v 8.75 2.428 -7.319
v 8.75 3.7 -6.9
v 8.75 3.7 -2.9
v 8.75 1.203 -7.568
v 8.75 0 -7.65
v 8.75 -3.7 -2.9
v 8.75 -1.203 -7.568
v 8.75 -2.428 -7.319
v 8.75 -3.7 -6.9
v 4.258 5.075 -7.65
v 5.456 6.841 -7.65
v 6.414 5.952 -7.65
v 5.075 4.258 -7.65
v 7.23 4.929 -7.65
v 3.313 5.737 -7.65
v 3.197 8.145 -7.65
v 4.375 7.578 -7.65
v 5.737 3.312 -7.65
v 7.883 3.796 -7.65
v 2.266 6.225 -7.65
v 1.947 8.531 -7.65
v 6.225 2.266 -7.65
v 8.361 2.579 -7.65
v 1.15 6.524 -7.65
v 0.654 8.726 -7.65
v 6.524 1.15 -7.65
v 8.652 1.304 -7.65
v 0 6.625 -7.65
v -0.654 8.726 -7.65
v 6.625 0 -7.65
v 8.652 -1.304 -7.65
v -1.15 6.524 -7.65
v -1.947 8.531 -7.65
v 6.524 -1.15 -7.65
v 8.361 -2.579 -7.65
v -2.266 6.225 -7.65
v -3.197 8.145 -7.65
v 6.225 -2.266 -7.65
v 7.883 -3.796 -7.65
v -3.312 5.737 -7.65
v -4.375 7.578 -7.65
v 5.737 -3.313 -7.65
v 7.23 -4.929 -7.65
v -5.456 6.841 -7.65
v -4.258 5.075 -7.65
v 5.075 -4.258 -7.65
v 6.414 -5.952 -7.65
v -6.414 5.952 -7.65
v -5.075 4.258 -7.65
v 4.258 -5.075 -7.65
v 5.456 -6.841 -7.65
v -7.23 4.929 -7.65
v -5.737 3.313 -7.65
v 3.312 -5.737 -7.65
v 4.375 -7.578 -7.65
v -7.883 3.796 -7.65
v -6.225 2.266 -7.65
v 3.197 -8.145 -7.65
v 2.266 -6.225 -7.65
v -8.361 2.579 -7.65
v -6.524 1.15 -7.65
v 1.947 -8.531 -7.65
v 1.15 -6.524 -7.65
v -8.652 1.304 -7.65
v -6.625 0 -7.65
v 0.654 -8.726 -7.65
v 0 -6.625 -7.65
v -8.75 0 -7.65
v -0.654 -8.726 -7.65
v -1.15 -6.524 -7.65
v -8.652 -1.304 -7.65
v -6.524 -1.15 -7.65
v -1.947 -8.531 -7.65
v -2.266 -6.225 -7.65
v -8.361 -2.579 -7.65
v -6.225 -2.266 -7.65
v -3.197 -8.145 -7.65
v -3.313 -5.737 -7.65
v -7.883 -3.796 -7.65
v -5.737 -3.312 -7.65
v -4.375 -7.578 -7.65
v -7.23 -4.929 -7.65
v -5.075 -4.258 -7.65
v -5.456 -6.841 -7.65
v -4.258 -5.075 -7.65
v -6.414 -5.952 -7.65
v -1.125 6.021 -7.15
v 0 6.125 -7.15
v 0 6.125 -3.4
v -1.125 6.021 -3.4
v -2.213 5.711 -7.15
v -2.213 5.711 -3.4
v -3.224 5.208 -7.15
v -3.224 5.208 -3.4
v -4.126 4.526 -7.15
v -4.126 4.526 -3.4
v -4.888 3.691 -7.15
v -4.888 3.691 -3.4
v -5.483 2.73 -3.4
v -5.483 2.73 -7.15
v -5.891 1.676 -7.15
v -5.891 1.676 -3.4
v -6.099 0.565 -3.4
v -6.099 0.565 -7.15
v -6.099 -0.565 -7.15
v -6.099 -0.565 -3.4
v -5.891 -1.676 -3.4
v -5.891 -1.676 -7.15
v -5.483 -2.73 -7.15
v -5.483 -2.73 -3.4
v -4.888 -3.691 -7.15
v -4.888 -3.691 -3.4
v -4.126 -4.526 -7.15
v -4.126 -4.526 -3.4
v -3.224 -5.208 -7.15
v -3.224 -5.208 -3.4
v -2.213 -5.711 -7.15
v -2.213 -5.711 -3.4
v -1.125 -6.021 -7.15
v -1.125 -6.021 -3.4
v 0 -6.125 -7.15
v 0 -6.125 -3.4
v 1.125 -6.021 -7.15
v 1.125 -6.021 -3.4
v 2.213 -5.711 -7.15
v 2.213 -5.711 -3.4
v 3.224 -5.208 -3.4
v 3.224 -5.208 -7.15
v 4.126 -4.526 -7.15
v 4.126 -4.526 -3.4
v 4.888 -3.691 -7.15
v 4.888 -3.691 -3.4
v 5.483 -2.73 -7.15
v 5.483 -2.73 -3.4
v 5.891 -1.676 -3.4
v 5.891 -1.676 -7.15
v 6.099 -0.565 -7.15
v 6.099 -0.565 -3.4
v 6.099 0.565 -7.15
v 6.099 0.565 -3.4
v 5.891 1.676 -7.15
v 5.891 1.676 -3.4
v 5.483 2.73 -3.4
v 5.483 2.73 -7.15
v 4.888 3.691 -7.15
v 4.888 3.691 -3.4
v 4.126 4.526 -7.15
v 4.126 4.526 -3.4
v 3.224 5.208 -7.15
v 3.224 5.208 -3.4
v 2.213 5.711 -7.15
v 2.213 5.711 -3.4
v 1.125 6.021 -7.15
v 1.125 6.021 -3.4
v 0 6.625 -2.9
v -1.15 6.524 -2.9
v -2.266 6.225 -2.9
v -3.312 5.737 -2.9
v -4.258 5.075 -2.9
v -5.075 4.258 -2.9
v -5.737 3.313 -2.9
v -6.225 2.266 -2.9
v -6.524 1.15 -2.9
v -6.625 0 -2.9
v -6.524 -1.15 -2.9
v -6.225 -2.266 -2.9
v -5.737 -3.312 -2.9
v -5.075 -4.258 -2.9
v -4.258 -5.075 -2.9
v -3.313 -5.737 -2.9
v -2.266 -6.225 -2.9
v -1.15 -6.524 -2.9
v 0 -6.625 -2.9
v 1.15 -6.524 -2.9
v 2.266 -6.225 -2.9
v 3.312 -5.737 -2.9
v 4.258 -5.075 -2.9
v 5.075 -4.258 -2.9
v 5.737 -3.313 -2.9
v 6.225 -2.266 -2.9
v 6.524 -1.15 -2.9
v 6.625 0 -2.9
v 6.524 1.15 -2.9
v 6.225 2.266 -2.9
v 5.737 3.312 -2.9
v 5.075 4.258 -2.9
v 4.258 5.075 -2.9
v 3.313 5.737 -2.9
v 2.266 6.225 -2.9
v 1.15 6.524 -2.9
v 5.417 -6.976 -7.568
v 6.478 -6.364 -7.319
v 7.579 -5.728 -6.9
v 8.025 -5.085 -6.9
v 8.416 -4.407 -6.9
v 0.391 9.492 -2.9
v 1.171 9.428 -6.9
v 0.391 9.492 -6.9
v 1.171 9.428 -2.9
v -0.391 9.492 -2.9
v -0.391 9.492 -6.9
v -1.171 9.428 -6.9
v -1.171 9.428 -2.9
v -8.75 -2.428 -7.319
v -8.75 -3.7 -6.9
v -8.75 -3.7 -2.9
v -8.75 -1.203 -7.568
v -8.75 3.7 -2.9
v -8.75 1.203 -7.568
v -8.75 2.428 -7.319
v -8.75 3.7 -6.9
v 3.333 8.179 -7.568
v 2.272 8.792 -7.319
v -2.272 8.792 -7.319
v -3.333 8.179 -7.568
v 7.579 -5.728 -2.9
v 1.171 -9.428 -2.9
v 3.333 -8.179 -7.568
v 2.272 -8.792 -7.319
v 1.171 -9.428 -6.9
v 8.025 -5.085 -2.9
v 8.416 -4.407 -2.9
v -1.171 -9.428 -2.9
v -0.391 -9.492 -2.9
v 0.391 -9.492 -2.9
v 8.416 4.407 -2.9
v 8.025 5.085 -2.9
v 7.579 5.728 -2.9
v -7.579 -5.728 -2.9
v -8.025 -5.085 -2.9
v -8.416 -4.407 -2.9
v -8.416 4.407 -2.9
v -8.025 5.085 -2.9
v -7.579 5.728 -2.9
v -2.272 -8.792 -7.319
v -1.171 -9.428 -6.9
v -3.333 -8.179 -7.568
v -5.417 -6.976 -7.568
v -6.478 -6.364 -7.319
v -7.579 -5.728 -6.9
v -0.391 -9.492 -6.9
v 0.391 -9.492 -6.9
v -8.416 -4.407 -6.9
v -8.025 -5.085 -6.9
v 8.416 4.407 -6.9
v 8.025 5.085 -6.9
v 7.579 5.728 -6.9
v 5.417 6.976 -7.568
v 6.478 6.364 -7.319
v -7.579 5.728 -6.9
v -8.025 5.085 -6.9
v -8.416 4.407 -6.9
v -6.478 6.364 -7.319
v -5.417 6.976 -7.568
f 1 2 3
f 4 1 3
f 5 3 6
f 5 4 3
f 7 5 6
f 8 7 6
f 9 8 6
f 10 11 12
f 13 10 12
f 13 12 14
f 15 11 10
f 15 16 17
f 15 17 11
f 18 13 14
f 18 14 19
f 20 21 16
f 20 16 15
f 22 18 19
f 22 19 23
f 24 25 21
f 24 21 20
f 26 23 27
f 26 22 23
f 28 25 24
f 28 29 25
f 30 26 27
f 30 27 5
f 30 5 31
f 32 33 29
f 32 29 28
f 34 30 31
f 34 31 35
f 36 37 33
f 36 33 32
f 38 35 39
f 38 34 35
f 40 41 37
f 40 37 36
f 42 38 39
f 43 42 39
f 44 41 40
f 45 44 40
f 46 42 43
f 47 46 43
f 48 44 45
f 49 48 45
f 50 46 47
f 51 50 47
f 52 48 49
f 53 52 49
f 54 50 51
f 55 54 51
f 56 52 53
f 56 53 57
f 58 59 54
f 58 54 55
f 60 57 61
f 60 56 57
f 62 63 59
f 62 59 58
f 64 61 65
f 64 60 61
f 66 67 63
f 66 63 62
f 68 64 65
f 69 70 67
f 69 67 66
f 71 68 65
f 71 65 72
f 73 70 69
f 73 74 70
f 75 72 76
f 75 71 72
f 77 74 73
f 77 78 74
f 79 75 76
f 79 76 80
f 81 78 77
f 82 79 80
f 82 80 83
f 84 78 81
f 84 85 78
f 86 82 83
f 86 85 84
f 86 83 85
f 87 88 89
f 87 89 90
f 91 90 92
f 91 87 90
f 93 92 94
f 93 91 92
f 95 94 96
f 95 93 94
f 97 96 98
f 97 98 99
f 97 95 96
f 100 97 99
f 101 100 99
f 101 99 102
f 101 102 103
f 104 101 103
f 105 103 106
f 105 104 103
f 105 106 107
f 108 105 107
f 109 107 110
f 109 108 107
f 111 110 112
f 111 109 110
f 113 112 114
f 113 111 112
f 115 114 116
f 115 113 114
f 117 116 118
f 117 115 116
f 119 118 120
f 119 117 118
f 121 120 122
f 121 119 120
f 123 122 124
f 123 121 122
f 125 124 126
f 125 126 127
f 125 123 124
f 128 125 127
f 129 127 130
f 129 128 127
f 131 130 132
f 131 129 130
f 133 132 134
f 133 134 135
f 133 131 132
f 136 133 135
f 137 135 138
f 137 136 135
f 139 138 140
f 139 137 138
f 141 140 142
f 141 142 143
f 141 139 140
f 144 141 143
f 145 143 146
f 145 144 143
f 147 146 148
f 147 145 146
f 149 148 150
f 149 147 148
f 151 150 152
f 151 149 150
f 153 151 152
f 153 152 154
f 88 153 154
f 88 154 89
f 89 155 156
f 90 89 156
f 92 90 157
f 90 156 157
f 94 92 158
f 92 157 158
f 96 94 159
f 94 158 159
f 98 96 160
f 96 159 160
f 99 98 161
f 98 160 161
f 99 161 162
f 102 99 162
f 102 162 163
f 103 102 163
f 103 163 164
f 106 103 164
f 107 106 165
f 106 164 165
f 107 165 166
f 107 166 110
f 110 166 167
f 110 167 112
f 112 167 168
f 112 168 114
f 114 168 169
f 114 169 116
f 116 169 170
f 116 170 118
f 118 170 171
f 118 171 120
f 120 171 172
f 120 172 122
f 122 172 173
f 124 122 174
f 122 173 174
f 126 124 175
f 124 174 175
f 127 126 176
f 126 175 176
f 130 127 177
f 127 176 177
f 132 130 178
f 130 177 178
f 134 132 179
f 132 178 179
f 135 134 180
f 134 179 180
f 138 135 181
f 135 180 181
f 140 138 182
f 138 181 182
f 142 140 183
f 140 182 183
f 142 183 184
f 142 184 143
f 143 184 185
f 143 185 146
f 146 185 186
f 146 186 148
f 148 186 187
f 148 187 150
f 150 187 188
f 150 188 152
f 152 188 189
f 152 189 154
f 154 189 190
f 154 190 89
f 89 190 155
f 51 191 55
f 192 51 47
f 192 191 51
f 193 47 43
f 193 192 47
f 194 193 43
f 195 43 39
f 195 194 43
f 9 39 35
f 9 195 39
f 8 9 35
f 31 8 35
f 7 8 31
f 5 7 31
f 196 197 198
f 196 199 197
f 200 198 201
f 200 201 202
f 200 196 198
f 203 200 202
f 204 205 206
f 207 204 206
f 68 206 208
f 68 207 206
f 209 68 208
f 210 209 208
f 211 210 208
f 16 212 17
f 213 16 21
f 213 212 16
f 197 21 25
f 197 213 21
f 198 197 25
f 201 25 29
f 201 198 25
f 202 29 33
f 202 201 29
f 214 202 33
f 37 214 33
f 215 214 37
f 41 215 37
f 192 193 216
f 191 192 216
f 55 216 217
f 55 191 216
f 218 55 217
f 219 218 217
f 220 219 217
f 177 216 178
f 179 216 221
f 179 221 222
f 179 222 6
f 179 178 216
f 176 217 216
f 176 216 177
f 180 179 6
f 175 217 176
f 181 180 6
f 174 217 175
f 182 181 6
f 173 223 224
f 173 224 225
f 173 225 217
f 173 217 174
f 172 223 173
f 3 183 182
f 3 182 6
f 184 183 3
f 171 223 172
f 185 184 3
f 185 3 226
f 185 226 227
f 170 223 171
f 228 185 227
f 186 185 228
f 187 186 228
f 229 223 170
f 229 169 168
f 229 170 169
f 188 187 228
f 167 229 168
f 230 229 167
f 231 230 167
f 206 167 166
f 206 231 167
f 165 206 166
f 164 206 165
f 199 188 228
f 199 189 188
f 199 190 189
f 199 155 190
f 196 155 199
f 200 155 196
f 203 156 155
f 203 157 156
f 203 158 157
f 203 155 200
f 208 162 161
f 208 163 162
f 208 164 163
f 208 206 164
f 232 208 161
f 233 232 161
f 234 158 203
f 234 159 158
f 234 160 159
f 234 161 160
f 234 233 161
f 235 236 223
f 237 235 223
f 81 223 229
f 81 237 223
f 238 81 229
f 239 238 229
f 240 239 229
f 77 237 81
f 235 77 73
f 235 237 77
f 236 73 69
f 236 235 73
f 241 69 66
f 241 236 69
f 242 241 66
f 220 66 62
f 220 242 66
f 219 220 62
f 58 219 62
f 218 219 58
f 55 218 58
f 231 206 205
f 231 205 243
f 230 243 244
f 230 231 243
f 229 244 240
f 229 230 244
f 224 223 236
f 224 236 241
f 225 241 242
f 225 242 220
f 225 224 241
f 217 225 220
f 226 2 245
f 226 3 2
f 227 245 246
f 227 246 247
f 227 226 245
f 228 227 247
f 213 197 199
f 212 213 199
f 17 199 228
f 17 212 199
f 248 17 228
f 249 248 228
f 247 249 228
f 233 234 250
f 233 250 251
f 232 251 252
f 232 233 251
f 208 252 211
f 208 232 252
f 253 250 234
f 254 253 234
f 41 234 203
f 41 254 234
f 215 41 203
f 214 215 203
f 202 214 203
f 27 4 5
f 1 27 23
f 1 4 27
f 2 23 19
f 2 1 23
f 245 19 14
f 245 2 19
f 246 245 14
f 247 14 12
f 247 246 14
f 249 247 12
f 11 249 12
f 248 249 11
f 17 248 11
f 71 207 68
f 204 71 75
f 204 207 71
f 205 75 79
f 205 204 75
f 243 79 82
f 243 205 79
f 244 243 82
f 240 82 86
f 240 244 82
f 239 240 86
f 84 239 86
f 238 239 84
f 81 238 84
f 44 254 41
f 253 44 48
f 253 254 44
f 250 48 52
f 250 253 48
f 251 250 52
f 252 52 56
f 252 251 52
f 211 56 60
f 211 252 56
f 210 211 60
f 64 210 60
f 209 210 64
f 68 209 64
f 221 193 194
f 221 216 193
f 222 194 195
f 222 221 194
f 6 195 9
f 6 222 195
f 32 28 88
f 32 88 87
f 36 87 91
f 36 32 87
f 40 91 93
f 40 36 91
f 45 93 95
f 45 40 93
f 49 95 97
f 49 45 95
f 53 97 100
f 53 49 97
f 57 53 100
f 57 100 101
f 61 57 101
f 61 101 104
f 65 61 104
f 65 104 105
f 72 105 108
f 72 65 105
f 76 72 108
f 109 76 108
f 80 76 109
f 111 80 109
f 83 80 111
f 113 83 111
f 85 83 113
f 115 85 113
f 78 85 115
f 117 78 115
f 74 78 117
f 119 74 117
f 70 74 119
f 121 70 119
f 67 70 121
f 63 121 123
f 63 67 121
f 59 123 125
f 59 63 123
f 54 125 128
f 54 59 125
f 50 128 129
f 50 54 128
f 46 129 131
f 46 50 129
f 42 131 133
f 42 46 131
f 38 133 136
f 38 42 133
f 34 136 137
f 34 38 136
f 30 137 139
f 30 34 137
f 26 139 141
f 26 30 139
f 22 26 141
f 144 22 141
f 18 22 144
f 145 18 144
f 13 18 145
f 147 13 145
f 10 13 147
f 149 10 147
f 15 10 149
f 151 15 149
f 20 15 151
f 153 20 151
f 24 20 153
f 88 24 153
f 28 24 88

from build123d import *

# Parameters (mm, degrees)
SKETCH005_R     = 15.040905
POCKET002_DEPTH = 4.751
CHAMFER_SIZE    = 0.5


with BuildPart() as part:
    # Sketch004 → Revolution002 (revolve)
    with BuildSketch(Plane.YZ):
        Polygon((6.125, 0), (6.125, -4.75), (8.75, -4.75), (9.5, -4), (9.5, 0), align=None)
    revolve(axis=Axis((0, 0, 0), (0, 0, 1)))

    # Sketch005 (on Face2 of Revolution002) → Pocket002 (cut, through all)
    with BuildSketch(Plane.YX.offset(4.75)):
        Circle(SKETCH005_R)
        Polygon((10.10363, 0), (5.051815, 8.75), (-5.051815, 8.75), (-10.10363, 0), (-5.051815, -8.75), (5.051815, -8.75), align=None, mode=Mode.SUBTRACT)
    extrude(amount=-POCKET002_DEPTH, mode=Mode.SUBTRACT)

    # Chamfer
    chamfer_edges = [part.edges().sort_by_distance(p)[0] for p in [
        (0, -6.125, -4.75),
        (0, -6.125, 0),
    ]]
    chamfer(chamfer_edges, length=CHAMFER_SIZE)


with BuildPart() as part_1:
    # Body002 placement: moved
    add(part.part.moved(Location((0, 0, -2.9))))


solid = part_1.part
